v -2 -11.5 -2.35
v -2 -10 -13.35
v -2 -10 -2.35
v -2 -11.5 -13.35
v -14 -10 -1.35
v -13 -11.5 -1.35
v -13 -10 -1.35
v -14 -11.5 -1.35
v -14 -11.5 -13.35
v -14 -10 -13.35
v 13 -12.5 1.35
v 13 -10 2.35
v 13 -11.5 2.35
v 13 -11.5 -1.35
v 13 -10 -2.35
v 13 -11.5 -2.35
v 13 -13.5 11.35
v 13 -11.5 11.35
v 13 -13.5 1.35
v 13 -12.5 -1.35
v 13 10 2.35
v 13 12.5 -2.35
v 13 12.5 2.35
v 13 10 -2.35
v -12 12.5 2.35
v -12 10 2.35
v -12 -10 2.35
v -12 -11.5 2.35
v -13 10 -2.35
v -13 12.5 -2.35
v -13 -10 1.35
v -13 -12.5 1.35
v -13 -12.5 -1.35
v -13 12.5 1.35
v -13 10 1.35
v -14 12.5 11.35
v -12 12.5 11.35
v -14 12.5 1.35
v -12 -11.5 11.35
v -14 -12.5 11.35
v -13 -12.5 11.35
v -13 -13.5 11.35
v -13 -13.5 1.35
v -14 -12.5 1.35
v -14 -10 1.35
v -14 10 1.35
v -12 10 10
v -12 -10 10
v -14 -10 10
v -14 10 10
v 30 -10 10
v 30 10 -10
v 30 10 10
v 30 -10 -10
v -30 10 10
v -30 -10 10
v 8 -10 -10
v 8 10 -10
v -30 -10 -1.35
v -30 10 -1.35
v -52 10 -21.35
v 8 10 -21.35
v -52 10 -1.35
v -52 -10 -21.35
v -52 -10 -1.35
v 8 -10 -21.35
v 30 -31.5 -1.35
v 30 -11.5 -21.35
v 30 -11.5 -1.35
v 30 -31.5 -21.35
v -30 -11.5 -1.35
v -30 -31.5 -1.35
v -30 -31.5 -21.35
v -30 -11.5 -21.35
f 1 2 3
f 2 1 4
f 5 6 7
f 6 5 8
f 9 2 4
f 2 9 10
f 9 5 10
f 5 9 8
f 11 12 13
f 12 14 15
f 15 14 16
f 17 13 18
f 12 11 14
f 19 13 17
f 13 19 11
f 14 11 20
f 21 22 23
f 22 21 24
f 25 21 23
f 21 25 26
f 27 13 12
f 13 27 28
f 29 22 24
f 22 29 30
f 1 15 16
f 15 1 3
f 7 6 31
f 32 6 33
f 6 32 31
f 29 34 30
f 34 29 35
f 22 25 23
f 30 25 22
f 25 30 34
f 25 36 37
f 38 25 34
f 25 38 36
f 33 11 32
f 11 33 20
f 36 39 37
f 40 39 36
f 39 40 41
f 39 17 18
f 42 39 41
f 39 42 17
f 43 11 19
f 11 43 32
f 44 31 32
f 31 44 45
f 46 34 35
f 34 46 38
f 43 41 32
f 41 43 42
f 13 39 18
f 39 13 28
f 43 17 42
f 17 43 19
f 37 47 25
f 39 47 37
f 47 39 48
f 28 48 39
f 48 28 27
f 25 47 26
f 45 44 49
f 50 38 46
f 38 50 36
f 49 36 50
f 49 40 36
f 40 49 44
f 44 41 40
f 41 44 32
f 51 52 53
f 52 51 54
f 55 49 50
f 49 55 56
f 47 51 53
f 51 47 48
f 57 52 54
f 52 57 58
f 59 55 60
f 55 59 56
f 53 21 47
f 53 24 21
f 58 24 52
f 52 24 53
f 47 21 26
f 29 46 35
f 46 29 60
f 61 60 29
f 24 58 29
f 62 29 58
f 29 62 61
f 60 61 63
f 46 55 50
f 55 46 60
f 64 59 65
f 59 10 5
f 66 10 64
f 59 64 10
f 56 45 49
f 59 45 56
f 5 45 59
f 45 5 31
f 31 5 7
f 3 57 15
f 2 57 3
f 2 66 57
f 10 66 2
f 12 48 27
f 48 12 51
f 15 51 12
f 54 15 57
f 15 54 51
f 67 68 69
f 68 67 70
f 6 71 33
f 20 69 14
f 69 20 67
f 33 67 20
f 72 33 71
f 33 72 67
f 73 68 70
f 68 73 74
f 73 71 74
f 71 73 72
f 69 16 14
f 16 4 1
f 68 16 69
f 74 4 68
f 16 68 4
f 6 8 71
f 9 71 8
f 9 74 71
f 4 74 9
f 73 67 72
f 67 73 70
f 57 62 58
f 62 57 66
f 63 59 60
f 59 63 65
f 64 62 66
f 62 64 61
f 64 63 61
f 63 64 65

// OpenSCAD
// Parameters
length = 26; //[13:52:1]
width = 25; //[12.5:50:1]
thickness = 4.7; //[2.35:9.4:0.1]
hole_count = 2; //[2:2:1]
hole_diameter = 5; //[2.5:10:0.1]
hole_center_offset_from_inner_corner = 10; //[5:20:0.5]
corner_radius = 0; //[0:5:0.5]
rib_thickness = 2; //[1:4:0.5]
rib_height = 10; //[5:20:1]
overlap = 1; //[0.5:2:0.1]
extrusion_size = 20; //[10:40:1]
extrusion_length = 60; //[30:120:1]
inner_corner_bracket_size = 12; //[6:24:1]

// Extrusion - complete geometry
module extrusion() {
  color("Silver") {
    cube([extrusion_length, extrusion_size, extrusion_size], center=true);
  }
}

// Extrusion Inner Corner Bracket - complete geometry
module extrusion_inner_corner_bracket() {
  color("DimGray") {
    difference() {
      cube([inner_corner_bracket_size, inner_corner_bracket_size, inner_corner_bracket_size], center=true);
      translate([0, 0, -inner_corner_bracket_size/2])
        cylinder(d=hole_diameter, h=inner_corner_bracket_size, center=true, $fn=32);
    }
  }
}

// Extrusion Corner Bracket - complete geometry
module extrusion_corner_bracket() {
  color("Silver") {
    difference() {
      cube([length, width, thickness], center=true);
      translate([-length/2 + hole_center_offset_from_inner_corner, -width/2 + hole_center_offset_from_inner_corner, 0])
        cylinder(d=hole_diameter, h=thickness + 2*overlap, center=true, $fn=32);
      translate([length/2 - hole_center_offset_from_inner_corner, width/2 - hole_center_offset_from_inner_corner, 0])
        cylinder(d=hole_diameter, h=thickness + 2*overlap, center=true, $fn=32);
    }
  }
}

// Extrusion Corner Bracket 3D - complete geometry
module extrusion_corner_bracket_3D() {
  color("Silver") {
    union() {
      extrusion_corner_bracket();
      translate([0, -width/2 + rib_thickness/2 - overlap, thickness/2 + rib_height/2 - overlap])
        cube([length, rib_thickness, rib_height], center=true);
      translate([-length/2 + rib_thickness/2 - overlap, 0, thickness/2 + rib_height/2 - overlap])
        cube([rib_thickness, width, rib_height], center=true);
    }
  }
}

// Extrusion Corner Bracket Hole Positions - complete geometry
module extrusion_corner_bracket_hole_positions() {
  color("Black") {
    translate([-length/2 + hole_center_offset_from_inner_corner, -width/2 + hole_center_offset_from_inner_corner, thickness/2 + hole_diameter/4 - overlap])
      sphere(r=hole_diameter/4, center=true);
    translate([length/2 - hole_center_offset_from_inner_corner, width/2 - hole_center_offset_from_inner_corner, thickness/2 + hole_diameter/4 - overlap])
      sphere(r=hole_diameter/4, center=true);
  }
}

// Assembly
module assembly() {
  extrusion();
  translate([0, -width/2 - extrusion_size/2 + overlap, -thickness/2 - extrusion_size/2 + overlap]) extrusion();
  translate([-length/2 - extrusion_size/2 + overlap, 0, -thickness/2 - extrusion_size/2 + overlap]) extrusion();
  translate([-length/2 + inner_corner_bracket_size/2 - overlap, -width/2 + inner_corner_bracket_size/2 - overlap, -thickness/2 - inner_corner_bracket_size/2 + overlap]) extrusion_inner_corner_bracket();
  extrusion_corner_bracket_3D();
  extrusion_corner_bracket_hole_positions();
}

assembly();
